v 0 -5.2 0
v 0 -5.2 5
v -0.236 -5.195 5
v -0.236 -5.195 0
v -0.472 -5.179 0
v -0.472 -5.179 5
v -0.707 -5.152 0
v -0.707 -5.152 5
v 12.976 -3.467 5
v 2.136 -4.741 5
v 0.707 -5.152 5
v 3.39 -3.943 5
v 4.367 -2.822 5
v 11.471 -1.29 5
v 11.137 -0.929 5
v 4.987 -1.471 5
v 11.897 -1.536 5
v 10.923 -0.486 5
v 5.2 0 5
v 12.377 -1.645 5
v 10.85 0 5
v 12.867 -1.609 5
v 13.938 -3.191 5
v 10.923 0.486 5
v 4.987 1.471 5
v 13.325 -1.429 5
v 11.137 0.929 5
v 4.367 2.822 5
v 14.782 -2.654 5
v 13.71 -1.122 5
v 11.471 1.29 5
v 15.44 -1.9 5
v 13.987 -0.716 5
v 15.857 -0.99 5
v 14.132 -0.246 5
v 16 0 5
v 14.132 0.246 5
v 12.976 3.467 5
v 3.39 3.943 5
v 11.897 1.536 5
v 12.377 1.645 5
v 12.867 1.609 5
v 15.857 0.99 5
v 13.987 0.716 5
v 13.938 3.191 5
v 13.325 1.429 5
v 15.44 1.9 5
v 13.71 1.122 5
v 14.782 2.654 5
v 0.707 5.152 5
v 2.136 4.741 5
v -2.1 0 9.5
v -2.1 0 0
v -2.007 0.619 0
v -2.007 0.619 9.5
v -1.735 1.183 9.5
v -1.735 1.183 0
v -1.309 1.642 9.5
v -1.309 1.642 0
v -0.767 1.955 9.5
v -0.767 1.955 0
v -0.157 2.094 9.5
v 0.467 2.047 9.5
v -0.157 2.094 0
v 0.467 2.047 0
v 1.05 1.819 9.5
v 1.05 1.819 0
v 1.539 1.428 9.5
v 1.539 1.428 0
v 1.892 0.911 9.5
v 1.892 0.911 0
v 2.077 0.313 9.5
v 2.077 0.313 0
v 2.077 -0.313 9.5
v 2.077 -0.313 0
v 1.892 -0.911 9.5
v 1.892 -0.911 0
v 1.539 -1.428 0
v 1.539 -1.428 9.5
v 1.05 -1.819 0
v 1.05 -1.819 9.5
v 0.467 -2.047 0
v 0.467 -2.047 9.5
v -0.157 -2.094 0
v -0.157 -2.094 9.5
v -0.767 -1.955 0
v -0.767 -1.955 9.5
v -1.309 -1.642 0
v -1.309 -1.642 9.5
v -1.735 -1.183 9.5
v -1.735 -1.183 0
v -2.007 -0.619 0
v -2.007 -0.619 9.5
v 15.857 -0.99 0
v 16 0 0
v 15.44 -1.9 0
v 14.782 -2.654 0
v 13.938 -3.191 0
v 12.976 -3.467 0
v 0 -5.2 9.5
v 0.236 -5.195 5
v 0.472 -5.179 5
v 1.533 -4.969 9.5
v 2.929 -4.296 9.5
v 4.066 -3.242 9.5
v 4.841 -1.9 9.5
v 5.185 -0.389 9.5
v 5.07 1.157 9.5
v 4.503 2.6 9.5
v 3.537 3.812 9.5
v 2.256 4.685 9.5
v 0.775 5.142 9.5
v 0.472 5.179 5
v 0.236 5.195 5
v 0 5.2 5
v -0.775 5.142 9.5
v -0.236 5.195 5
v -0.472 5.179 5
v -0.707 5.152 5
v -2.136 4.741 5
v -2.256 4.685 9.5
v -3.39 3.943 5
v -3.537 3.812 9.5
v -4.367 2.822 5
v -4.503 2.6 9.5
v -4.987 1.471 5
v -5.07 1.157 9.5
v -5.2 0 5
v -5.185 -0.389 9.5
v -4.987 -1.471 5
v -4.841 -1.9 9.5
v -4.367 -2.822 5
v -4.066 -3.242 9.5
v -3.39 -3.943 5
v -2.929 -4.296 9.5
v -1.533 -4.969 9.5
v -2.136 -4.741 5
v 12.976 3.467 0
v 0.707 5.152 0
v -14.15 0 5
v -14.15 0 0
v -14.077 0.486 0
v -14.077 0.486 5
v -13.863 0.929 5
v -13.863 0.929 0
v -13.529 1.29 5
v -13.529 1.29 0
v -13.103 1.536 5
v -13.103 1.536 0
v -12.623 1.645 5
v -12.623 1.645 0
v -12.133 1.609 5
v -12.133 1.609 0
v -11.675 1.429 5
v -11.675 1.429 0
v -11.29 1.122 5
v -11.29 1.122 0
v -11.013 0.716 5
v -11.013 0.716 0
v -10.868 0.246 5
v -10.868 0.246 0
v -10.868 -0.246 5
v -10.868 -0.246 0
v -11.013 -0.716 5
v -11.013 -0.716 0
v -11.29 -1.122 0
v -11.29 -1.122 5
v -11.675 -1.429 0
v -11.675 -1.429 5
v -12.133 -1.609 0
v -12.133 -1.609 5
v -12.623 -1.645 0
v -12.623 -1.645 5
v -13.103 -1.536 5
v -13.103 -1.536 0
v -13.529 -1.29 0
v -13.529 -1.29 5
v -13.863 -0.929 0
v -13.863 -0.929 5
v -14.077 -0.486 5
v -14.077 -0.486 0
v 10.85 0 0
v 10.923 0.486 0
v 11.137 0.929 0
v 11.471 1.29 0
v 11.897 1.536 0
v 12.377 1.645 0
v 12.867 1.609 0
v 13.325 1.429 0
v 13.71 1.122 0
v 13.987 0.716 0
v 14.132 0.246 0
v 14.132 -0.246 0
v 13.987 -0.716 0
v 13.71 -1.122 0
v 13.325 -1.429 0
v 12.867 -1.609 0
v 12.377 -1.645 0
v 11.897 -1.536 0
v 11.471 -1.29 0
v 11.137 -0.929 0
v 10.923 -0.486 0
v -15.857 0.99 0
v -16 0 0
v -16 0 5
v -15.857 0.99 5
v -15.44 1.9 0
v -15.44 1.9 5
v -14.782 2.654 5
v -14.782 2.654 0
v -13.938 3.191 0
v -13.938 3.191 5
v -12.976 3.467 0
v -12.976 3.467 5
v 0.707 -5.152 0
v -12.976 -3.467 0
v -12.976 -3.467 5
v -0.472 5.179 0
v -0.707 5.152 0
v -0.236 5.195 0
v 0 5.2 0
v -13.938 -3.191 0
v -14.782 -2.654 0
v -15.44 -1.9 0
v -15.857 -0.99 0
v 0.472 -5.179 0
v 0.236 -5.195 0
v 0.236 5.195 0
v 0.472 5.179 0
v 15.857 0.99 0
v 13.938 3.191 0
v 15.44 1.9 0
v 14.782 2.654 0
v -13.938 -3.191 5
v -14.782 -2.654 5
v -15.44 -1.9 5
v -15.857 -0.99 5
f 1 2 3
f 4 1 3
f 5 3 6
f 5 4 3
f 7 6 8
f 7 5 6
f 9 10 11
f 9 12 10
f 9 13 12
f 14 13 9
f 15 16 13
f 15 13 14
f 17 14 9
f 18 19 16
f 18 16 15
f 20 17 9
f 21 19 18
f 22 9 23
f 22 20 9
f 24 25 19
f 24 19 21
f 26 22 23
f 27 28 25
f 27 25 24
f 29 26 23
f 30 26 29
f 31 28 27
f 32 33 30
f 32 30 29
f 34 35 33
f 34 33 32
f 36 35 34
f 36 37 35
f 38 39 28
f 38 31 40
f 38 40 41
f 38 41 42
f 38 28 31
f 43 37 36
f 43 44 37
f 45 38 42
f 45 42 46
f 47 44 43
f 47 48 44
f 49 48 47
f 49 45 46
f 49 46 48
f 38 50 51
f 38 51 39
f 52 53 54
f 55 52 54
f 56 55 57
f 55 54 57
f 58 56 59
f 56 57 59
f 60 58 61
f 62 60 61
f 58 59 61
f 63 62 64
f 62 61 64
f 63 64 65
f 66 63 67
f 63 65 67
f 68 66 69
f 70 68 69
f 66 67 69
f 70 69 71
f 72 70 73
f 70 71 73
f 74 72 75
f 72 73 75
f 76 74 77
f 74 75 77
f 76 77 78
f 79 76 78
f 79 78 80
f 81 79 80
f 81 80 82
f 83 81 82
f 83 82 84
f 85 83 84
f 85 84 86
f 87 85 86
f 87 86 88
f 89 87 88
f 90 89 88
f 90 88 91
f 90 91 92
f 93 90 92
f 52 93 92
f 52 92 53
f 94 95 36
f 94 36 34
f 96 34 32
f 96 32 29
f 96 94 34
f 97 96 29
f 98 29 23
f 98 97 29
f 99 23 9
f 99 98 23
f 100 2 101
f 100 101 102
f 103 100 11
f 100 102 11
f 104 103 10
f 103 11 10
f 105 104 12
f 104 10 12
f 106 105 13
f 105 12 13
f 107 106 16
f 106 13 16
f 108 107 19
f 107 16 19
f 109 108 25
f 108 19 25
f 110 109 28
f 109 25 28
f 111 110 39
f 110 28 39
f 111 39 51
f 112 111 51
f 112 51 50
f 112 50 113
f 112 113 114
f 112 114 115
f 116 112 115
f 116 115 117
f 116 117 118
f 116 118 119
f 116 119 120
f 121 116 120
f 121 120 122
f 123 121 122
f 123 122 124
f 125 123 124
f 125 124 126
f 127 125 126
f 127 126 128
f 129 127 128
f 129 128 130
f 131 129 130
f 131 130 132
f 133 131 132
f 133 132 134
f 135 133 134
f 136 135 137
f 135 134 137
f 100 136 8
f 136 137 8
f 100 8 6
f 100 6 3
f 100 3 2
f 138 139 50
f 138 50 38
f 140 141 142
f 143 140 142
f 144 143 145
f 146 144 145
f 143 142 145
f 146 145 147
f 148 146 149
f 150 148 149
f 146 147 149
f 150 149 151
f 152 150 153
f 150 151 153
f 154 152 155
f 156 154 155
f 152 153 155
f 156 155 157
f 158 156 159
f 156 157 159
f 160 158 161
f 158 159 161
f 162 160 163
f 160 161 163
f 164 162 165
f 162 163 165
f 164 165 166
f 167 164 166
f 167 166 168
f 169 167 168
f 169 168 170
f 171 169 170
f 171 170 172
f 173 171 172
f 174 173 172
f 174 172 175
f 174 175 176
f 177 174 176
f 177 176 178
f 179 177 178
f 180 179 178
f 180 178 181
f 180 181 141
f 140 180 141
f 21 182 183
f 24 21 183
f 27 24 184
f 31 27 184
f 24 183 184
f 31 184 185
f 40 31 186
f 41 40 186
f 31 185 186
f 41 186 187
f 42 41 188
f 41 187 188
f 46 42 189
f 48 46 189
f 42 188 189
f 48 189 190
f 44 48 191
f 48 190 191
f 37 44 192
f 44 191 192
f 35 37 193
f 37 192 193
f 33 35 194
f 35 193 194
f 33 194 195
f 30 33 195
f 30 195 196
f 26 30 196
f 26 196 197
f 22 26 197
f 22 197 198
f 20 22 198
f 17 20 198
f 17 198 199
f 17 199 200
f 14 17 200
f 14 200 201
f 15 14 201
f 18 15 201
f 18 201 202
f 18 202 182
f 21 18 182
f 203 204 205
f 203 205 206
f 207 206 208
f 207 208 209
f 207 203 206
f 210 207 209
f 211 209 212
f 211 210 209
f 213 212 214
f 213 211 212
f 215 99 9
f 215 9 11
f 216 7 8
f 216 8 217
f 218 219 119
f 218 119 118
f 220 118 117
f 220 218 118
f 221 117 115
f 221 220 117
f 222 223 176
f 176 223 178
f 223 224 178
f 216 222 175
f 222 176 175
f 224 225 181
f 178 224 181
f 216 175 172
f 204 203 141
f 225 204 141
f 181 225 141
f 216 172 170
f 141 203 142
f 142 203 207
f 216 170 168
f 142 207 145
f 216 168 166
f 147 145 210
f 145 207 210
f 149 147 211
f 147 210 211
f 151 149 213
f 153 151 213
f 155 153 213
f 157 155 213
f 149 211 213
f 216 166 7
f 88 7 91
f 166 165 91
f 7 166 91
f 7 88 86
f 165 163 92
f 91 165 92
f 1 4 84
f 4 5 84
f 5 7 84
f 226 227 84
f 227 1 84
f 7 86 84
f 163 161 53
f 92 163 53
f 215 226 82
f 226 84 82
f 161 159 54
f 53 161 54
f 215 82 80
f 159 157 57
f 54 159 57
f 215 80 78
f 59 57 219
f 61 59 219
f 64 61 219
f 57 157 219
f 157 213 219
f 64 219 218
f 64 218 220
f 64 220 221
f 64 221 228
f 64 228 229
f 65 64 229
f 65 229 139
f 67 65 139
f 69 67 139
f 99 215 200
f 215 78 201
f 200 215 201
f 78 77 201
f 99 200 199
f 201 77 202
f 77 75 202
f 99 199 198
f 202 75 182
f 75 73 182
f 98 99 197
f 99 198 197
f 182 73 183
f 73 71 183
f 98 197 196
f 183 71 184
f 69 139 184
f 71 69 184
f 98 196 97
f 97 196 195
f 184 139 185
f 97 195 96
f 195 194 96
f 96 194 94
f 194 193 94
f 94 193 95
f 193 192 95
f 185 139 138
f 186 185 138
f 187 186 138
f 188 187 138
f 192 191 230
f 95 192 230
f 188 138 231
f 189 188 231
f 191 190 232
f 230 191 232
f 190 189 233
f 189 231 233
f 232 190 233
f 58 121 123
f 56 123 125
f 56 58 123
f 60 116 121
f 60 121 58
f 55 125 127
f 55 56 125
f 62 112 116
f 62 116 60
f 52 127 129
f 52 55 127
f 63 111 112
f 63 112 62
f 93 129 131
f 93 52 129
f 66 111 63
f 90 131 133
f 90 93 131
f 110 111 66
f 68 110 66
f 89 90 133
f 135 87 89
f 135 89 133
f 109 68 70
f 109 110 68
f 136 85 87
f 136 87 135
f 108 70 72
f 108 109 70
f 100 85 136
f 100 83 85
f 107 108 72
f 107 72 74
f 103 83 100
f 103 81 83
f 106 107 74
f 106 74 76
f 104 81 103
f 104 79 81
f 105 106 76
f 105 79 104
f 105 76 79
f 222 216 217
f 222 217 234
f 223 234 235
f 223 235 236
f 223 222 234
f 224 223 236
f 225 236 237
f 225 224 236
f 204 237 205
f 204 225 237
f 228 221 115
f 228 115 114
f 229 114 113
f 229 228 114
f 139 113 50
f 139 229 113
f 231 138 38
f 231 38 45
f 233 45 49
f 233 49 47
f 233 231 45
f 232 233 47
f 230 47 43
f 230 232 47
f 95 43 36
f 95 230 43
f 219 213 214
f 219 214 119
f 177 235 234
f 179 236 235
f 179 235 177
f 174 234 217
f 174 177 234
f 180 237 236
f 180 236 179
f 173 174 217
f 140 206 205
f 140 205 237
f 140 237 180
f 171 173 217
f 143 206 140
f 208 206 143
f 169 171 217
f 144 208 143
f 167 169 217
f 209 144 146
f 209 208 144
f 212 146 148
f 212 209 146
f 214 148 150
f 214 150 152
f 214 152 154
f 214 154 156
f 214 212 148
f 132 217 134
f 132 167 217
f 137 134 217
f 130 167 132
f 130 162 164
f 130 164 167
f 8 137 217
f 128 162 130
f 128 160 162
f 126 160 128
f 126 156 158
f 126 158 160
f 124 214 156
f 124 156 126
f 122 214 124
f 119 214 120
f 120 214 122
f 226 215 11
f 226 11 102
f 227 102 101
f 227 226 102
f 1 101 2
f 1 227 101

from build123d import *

# Parameters (mm, degrees)
SKETCH_1_W             = 32
SKETCH_1_H             = 10.4
SKETCH_1_R             = 0.5
EXTRUDE_1_DEPTH        = 5
SKETCH_2_R             = 5.2
SKETCH_2_R_2           = 0.5
EXTRUDE_2_DEPTH        = 4.5
CUT_EXTRUDE_START      = -5.3
CUT_EXTRUDE_1_DEPTH    = 5.3
HOLE_WIZARD_M4_1_D     = 3.3
HOLE_WIZARD_M4_1_DEPTH = 10.1
HOLE_WIZARD_M4_1_TIP   = 0.991420021
HOLE_WIZARD_M5_1_D     = 4.2
HOLE_WIZARD_M5_1_DEPTH = 22.4
HOLE_WIZARD_M5_1_TIP   = 1.2618073


with BuildPart() as part:
    # 草图1 → 凸台-拉伸1 (new body)
    with BuildSketch(Plane.XY):
        Rectangle(SKETCH_1_W, SKETCH_1_H)
        with Locations((-12.5, 0)):
            Circle(SKETCH_1_R, mode=Mode.SUBTRACT)
        with Locations((12.5, 0)):
            Circle(SKETCH_1_R, mode=Mode.SUBTRACT)
        Circle(SKETCH_1_R, mode=Mode.SUBTRACT)
    extrude(amount=EXTRUDE_1_DEPTH)

    # 草图2 → 凸台-拉伸2 (add)
    with BuildSketch(Plane.XY.offset(5)):
        with Locations(Location((0, 0, 0), (0, 0, 270))):
            Circle(SKETCH_2_R)
        Circle(SKETCH_2_R_2, mode=Mode.SUBTRACT)
    extrude(amount=EXTRUDE_2_DEPTH)

    # 草图3 → 切除-拉伸1 (cut)
    with BuildSketch(Plane.XY.offset(5).offset(CUT_EXTRUDE_START)):
        with BuildLine():
            Line((-12.976, 3.46748093), (-0.7072, 5.151685953))
            ThreePointArc((-0.7072, 5.151685953), (-0.354424212, 5.187907428), (0, 5.2))
            Line((0, 5.2), (-16, 5.2))
            Line((-16, 5.2), (-16, 0))
            ThreePointArc((-16, 0), (-15.137802115, 2.300434742), (-12.976, 3.46748093))
        make_face()
        with BuildLine():
            ThreePointArc((0, -5.2), (-0.354424212, -5.187907428), (-0.7072, -5.151685953))
            Line((-0.7072, -5.151685953), (-12.976, -3.46748093))
            ThreePointArc((-12.976, -3.46748093), (-15.137802115, -2.300434742), (-16, 0))
            Line((-16, 0), (-16, -5.2))
            Line((-16, -5.2), (0, -5.2))
        make_face()
        with BuildLine():
            ThreePointArc((0.7072, -5.151685953), (0.354424212, -5.187907428), (0, -5.2))
            Line((0, -5.2), (16, -5.2))
            Line((16, -5.2), (16, 0))
            ThreePointArc((16, 0), (15.137802115, -2.300434742), (12.976, -3.46748093))
            Line((12.976, -3.46748093), (0.7072, -5.151685953))
        make_face()
        with BuildLine():
            Line((16, 5.2), (0, 5.2))
            ThreePointArc((0, 5.2), (0.354424212, 5.187907428), (0.7072, 5.151685953))
            Line((0.7072, 5.151685953), (12.976, 3.46748093))
            ThreePointArc((12.976, 3.46748093), (15.137802115, 2.300434742), (16, 0))
            Line((16, 0), (16, 5.2))
        make_face()
    extrude(amount=CUT_EXTRUDE_1_DEPTH, mode=Mode.SUBTRACT)

    # M4 螺纹孔1
    with Locations(Plane.XY.offset(5)):
        with Locations((-12.5, 0), (12.5, 0)):
            Hole(HOLE_WIZARD_M4_1_D / 2, depth=HOLE_WIZARD_M4_1_DEPTH)
            with Locations((0, 0, -(HOLE_WIZARD_M4_1_DEPTH + HOLE_WIZARD_M4_1_TIP / 2))):  # 118° drill point
                Cone(0, HOLE_WIZARD_M4_1_D / 2, HOLE_WIZARD_M4_1_TIP, mode=Mode.SUBTRACT)

    # M5 螺纹孔1
    with Locations(Plane.XY.offset(9.5)):
        with Locations((0, 0)):
            Hole(HOLE_WIZARD_M5_1_D / 2, depth=HOLE_WIZARD_M5_1_DEPTH)
            with Locations((0, 0, -(HOLE_WIZARD_M5_1_DEPTH + HOLE_WIZARD_M5_1_TIP / 2))):  # 118° drill point
                Cone(0, HOLE_WIZARD_M5_1_D / 2, HOLE_WIZARD_M5_1_TIP, mode=Mode.SUBTRACT)


solid = part.part
